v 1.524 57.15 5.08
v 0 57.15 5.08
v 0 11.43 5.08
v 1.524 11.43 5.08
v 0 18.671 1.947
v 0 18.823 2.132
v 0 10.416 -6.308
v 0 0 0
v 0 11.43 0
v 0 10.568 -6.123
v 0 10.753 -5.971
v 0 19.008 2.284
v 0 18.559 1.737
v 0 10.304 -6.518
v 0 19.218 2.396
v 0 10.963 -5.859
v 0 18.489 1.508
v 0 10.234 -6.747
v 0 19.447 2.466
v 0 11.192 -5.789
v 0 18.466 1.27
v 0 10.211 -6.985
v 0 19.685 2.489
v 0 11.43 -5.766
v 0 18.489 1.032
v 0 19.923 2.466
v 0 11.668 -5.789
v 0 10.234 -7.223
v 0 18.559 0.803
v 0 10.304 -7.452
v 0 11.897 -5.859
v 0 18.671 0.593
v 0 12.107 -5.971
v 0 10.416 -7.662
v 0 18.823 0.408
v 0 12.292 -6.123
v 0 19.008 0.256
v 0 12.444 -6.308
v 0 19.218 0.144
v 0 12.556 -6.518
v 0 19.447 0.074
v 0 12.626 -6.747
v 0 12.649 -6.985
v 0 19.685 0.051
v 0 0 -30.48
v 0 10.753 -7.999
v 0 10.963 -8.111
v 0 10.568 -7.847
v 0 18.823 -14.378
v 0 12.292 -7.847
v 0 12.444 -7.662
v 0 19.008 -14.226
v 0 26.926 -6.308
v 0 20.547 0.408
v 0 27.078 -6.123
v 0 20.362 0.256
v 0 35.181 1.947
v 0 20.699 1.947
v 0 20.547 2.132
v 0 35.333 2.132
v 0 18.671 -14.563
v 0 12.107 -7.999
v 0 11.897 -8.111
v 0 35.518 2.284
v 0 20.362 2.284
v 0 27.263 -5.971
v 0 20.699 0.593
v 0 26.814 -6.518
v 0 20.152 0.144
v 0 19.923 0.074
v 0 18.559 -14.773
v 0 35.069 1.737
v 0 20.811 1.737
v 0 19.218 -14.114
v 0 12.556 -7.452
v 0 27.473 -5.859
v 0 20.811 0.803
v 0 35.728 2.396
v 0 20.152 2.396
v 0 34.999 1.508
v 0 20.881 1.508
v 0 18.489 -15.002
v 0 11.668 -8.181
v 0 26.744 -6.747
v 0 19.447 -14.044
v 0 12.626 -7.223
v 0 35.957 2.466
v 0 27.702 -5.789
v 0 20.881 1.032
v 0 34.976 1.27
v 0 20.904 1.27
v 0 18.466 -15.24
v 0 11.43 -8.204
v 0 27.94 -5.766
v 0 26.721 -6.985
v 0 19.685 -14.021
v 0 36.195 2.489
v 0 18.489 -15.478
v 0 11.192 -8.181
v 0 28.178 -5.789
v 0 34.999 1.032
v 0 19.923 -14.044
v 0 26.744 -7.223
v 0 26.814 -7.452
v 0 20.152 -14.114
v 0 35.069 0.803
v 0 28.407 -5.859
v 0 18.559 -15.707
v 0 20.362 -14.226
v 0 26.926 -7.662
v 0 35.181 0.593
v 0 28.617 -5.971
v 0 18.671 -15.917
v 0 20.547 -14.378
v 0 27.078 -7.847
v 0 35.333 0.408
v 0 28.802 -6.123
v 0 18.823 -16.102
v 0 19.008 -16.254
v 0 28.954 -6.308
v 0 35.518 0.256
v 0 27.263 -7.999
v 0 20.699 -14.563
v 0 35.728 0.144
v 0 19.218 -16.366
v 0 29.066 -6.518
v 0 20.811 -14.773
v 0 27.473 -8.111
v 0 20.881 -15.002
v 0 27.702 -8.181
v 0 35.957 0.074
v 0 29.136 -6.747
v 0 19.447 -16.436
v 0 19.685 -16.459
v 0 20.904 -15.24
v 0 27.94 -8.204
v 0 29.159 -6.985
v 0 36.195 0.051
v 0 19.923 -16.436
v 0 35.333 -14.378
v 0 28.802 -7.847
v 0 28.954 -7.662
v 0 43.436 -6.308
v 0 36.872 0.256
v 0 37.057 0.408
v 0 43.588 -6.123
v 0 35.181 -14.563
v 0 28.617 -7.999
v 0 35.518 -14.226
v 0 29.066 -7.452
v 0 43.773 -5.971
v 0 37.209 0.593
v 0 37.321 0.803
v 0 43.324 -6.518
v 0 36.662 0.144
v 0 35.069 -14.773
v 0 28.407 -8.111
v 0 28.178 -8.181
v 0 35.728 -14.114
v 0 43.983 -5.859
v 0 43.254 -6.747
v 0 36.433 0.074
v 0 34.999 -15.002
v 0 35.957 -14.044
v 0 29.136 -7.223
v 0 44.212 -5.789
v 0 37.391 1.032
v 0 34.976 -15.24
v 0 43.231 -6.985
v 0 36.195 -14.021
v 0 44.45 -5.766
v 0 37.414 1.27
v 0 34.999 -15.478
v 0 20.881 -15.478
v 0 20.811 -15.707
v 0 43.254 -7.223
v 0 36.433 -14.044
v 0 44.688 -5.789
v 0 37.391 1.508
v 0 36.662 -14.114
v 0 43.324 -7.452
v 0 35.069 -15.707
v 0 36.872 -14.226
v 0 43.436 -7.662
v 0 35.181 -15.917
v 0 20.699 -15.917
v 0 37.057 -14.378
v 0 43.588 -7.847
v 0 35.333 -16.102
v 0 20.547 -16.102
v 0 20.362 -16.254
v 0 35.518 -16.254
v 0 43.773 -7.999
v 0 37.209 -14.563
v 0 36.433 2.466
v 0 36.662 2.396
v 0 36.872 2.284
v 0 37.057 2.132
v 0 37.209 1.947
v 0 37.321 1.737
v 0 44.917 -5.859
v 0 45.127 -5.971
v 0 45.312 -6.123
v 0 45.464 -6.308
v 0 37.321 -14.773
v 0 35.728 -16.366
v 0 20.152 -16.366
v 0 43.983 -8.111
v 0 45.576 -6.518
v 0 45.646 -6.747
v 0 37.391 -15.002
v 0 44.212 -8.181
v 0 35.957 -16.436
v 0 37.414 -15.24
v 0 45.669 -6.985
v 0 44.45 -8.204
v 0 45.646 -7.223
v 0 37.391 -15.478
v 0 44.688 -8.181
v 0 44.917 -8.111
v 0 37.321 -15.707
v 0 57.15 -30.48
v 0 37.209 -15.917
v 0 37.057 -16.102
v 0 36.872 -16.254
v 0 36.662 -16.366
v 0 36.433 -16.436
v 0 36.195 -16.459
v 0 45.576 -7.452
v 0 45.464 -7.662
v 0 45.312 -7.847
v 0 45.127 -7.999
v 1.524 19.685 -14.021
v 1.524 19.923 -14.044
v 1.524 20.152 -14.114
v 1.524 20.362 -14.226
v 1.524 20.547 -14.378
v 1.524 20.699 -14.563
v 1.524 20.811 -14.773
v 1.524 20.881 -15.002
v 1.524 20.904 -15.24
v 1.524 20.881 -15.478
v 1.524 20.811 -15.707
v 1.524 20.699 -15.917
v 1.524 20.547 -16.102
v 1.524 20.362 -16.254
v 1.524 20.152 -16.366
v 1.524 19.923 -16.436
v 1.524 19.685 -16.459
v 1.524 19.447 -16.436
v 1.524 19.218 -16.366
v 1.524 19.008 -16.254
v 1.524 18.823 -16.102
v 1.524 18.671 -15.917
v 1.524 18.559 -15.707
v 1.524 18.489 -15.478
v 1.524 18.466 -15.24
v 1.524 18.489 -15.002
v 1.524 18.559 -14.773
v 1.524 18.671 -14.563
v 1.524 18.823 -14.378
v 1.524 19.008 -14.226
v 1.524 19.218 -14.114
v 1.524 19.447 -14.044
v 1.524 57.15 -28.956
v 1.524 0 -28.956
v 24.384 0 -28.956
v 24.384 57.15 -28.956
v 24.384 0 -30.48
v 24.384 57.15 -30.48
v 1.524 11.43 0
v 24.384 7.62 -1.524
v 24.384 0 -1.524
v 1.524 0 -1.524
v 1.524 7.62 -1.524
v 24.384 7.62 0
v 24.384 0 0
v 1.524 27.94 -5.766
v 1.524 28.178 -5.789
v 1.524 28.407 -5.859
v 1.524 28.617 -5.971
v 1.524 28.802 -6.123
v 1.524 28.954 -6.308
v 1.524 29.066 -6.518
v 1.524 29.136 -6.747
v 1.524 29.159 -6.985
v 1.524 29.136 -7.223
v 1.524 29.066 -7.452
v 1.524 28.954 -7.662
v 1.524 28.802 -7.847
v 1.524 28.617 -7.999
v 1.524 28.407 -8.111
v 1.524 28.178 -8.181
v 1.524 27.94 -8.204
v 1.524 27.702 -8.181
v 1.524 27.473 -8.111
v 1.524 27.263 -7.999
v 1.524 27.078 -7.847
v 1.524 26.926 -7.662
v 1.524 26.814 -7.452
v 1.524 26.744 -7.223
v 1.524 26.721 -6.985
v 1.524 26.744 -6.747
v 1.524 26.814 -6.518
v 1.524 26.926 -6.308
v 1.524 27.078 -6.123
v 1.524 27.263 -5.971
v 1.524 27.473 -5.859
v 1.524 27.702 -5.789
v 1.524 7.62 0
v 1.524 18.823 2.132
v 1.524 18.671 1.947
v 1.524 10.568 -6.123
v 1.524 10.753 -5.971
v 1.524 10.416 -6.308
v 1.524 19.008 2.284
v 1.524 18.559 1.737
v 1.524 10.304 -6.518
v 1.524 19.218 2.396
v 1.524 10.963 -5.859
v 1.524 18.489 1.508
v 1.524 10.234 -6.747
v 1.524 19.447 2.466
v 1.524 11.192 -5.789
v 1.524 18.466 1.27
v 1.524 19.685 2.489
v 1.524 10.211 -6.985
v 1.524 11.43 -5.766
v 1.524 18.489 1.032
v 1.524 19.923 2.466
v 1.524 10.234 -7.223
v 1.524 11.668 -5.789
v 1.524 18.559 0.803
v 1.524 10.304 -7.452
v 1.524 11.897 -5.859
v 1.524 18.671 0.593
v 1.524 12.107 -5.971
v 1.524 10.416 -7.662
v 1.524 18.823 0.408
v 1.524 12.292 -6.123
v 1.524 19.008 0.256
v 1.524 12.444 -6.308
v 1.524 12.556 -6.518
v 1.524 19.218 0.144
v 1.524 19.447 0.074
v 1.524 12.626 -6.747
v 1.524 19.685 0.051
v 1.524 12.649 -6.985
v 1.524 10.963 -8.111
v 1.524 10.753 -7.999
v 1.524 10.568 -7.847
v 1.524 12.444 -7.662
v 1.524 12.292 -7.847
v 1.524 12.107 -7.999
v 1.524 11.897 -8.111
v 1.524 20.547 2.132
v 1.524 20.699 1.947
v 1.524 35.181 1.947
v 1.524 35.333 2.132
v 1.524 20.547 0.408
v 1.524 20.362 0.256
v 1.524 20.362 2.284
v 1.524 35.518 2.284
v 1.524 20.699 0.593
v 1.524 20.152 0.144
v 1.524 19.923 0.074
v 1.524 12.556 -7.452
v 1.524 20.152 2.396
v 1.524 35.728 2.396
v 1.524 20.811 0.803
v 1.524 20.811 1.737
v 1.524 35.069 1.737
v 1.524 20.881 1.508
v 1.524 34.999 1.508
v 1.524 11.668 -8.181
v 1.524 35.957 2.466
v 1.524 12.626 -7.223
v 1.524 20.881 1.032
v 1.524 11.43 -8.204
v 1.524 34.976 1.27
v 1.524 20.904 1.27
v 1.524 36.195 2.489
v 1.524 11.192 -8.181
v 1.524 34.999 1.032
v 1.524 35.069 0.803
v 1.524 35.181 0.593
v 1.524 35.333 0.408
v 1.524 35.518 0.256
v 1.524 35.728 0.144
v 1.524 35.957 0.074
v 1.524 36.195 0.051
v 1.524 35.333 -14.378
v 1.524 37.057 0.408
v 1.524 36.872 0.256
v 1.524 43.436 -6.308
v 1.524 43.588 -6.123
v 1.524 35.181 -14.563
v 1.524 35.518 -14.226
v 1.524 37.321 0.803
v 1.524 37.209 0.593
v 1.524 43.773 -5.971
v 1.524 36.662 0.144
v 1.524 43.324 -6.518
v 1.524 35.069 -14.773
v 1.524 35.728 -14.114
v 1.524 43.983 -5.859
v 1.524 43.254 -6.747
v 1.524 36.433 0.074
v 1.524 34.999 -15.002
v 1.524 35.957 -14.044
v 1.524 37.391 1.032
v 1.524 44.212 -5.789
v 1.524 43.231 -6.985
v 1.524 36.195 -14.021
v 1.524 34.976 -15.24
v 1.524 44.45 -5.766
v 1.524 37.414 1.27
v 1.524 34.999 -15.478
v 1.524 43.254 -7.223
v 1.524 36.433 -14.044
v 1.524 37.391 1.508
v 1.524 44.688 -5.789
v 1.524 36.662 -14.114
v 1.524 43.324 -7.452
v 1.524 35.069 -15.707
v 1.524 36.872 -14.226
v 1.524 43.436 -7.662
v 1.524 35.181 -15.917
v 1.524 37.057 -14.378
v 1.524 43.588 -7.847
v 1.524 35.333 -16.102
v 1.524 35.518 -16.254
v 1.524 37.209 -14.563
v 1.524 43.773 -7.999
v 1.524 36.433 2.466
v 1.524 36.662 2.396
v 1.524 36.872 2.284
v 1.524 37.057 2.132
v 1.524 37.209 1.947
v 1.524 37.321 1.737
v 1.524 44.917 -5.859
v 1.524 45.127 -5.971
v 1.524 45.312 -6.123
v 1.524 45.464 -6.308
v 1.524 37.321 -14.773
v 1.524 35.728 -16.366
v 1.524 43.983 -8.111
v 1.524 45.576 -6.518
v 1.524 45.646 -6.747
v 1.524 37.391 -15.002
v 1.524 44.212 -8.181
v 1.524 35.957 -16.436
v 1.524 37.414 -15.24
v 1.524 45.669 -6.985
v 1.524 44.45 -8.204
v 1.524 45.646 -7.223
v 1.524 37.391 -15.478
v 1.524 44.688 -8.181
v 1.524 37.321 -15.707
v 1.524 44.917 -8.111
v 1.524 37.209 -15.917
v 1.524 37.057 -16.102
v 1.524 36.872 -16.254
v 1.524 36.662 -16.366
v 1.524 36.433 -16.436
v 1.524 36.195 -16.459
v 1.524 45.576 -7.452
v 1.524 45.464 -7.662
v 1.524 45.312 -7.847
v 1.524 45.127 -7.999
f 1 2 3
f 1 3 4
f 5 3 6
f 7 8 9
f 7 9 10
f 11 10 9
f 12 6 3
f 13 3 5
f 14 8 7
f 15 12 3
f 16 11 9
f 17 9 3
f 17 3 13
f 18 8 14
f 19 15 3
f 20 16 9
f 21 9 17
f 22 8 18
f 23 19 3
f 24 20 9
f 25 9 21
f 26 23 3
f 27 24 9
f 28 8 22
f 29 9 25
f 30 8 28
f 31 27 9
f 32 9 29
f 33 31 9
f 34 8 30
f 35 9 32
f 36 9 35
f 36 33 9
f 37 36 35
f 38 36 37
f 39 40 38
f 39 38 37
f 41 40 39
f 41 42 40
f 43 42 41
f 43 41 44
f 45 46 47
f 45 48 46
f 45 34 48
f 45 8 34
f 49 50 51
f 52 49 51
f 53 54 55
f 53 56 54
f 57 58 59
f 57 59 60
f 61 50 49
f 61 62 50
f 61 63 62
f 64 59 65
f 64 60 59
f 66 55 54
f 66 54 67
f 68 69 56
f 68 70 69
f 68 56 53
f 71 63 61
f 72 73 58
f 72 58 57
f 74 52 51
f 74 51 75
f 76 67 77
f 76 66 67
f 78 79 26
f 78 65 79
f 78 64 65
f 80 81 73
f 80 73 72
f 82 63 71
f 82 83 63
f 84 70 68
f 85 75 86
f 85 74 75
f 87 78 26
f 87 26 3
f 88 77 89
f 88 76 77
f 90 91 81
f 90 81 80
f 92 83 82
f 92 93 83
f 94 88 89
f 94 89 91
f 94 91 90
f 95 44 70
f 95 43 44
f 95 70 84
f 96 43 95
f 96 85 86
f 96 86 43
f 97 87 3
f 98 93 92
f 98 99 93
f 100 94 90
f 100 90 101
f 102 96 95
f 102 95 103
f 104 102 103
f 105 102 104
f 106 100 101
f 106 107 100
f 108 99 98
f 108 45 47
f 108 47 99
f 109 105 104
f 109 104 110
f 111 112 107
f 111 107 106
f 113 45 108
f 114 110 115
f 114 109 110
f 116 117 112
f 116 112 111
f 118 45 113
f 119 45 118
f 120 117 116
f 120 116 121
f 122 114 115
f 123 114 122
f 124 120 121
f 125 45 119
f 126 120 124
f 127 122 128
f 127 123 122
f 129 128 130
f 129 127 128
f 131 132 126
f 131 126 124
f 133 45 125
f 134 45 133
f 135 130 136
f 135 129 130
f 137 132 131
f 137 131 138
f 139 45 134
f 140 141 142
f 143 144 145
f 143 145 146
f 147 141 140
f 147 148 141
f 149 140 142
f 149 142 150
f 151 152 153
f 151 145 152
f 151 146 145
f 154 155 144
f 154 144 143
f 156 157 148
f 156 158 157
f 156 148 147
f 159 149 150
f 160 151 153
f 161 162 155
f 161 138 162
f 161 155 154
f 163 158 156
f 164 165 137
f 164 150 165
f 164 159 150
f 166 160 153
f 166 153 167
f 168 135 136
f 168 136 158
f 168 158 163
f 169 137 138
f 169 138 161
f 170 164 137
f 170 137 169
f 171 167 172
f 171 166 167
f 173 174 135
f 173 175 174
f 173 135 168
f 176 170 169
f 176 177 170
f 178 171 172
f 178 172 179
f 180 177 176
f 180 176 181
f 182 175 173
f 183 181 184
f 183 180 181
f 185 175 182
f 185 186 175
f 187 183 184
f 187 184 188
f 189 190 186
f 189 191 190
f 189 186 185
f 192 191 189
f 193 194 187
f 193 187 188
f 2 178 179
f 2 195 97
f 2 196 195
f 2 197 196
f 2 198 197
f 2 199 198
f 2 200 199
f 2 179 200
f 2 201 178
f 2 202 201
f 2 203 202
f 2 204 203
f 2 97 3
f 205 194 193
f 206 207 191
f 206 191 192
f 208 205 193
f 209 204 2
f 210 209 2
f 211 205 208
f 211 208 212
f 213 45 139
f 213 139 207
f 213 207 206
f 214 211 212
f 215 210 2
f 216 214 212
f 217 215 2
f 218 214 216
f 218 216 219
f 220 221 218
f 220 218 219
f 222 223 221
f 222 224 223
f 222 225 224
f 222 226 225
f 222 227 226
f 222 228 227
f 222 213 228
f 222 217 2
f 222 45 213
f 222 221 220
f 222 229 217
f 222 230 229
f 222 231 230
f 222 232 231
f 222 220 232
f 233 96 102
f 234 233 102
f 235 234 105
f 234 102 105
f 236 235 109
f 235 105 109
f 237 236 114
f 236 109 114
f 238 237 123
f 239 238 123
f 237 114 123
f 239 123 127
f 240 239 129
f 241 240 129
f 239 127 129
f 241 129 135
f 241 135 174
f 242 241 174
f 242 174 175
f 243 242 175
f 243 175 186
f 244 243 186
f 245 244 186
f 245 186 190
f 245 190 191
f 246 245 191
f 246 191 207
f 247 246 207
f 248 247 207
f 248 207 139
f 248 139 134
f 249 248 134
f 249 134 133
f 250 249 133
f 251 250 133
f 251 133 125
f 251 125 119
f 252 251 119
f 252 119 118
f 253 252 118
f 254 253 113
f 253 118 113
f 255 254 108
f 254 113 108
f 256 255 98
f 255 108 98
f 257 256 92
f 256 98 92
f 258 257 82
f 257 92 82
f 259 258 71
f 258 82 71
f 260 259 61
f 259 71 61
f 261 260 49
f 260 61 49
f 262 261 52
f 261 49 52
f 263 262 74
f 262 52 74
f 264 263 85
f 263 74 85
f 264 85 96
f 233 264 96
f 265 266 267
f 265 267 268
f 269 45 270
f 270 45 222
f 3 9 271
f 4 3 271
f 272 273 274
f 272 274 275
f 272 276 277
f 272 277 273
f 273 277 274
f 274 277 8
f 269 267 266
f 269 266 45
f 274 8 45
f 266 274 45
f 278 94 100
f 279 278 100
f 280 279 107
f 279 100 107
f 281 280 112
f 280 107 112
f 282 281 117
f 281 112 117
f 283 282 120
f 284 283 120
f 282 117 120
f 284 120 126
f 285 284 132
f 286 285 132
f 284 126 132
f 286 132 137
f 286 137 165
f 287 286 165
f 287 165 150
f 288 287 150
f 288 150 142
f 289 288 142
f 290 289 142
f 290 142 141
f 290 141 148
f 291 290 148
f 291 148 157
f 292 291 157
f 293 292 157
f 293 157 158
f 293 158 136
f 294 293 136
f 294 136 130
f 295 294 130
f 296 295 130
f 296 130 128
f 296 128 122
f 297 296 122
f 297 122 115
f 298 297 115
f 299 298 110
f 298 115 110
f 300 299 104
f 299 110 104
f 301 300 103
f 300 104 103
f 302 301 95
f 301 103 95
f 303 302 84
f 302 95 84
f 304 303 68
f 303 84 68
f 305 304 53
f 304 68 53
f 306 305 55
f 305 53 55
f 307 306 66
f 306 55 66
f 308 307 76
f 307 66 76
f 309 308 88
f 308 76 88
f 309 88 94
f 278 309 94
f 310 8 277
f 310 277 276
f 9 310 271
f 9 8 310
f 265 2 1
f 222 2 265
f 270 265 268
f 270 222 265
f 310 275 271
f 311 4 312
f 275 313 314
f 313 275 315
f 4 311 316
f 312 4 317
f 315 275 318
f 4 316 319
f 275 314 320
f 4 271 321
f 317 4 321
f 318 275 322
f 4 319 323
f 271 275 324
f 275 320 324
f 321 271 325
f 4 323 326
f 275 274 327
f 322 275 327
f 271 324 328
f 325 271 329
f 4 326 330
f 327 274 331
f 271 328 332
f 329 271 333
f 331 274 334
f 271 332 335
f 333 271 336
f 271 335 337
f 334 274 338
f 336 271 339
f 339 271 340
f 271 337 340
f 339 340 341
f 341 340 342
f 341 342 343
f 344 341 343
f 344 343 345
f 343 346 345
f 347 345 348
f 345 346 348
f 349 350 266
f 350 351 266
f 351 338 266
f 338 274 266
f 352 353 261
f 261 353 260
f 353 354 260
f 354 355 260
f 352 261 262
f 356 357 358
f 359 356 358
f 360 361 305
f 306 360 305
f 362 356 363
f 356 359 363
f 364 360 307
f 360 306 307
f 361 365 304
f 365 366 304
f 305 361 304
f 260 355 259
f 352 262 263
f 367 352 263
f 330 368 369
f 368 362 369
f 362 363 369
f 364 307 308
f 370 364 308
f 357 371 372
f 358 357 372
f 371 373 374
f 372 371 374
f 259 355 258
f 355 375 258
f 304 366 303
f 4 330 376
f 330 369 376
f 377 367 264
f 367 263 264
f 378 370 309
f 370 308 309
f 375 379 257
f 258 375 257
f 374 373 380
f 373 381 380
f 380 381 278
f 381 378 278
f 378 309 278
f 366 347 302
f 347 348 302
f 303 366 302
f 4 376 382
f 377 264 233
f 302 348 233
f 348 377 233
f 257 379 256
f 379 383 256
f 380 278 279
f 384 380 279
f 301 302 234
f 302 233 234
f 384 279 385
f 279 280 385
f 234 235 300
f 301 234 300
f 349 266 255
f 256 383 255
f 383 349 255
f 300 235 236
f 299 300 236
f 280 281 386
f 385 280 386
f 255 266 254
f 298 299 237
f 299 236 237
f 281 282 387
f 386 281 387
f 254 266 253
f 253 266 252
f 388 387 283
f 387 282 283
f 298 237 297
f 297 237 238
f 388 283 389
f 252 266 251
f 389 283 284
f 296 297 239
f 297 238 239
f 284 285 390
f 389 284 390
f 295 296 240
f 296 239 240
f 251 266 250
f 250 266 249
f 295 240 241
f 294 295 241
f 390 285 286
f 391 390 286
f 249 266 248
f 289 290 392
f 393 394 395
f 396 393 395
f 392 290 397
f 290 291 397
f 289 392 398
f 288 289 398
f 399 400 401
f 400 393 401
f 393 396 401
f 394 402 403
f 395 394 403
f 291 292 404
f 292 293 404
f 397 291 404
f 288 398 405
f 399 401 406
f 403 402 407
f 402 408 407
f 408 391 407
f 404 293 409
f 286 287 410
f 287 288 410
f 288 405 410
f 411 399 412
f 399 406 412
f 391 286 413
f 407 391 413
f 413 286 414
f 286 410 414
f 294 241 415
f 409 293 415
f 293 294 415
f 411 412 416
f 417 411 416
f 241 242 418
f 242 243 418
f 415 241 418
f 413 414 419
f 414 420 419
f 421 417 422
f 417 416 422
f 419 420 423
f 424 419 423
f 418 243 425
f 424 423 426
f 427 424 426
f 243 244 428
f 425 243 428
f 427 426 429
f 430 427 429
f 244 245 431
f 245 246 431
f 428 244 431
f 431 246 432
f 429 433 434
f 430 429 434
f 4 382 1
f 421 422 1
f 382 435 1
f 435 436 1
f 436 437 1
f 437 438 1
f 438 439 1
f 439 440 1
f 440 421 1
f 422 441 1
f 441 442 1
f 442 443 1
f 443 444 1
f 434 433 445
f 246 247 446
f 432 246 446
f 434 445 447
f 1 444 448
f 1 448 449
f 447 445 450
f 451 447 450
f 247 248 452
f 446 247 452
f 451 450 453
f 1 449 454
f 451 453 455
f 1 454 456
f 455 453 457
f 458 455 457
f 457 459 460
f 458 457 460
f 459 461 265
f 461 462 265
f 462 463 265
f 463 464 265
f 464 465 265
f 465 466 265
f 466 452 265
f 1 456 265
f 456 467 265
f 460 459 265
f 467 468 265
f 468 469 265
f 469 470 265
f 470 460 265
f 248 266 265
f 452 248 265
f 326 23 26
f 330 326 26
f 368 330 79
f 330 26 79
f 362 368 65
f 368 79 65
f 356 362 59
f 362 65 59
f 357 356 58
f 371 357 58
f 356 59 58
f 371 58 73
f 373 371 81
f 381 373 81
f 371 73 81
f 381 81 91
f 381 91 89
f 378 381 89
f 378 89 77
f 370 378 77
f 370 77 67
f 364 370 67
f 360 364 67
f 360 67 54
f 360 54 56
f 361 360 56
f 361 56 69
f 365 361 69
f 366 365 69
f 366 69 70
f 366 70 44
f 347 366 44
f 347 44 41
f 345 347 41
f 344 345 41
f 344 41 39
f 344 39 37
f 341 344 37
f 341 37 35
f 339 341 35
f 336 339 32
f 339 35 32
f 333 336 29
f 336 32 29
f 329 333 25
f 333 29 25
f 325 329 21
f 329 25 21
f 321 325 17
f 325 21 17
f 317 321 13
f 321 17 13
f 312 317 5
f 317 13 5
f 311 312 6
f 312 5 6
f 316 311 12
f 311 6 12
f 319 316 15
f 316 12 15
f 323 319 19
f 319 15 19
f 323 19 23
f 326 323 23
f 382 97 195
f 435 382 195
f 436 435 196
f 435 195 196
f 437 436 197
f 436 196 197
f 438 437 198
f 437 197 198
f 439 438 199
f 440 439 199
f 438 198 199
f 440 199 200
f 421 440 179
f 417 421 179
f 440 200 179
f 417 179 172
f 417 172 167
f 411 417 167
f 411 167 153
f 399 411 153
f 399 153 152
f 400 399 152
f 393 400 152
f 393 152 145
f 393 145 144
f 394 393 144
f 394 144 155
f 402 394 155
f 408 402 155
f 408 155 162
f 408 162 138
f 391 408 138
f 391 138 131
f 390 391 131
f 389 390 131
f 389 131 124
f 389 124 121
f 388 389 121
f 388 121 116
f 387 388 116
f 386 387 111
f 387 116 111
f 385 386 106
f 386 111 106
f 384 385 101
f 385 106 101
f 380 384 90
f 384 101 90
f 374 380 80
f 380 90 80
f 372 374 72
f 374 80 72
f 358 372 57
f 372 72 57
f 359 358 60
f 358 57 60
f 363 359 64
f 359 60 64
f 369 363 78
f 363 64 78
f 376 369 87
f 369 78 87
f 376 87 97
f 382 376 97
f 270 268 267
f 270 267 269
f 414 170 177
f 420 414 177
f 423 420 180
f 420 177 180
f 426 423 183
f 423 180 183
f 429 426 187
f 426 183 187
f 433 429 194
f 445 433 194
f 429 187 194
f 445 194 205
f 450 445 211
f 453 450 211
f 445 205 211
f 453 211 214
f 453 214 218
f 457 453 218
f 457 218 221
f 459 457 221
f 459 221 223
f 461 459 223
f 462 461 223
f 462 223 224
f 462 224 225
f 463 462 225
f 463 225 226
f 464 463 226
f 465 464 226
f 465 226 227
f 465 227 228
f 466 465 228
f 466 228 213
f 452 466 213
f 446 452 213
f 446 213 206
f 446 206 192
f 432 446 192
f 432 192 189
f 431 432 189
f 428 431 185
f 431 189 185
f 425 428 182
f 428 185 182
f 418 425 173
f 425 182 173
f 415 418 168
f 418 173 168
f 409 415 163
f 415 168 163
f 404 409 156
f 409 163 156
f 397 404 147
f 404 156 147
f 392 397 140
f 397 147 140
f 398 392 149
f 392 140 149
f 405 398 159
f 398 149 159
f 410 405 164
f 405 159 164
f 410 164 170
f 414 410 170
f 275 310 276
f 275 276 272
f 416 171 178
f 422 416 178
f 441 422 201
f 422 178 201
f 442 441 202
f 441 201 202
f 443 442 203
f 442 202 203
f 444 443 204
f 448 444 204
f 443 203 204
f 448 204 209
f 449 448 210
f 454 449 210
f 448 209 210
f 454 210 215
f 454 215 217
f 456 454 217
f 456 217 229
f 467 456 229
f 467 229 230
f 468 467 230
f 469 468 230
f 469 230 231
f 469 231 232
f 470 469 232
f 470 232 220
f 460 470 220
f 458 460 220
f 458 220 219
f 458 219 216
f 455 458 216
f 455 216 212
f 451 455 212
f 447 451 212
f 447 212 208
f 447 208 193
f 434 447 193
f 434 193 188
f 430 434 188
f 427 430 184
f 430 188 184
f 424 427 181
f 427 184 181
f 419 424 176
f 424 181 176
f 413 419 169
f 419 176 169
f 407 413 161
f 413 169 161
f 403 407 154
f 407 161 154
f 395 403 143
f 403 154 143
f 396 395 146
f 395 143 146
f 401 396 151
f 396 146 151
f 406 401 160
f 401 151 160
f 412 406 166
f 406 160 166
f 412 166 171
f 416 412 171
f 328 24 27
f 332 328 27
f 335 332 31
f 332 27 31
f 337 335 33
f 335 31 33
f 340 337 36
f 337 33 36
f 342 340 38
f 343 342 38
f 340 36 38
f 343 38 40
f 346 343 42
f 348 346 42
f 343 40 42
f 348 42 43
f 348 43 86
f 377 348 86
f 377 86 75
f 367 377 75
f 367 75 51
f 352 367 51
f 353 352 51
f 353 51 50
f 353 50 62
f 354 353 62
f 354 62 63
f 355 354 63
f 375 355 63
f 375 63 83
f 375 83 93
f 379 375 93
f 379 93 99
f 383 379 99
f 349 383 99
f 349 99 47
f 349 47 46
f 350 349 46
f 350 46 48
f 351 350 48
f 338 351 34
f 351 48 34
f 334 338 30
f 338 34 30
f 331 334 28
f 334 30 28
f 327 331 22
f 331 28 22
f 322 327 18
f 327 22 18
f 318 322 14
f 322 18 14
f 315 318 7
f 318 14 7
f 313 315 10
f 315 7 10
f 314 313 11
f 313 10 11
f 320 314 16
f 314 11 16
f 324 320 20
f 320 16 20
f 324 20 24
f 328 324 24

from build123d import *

# Parameters (mm, degrees)
SKETCH1_W             = 30.48
SKETCH1_H             = 57.15
BOSS_EXTRUDE1_DEPTH   = 1.524
SKETCH2_W             = 1.524
SKETCH2_H             = 57.15
SKETCH2_H_2           = 7.62
BOSS_EXTRUDE2_DEPTH   = 22.86
SKETCH3_W             = 1.524
SKETCH3_H             = 45.72
BOSS_EXTRUDE3_DEPTH   = 5.08
F_2_CLEARANCE_HOLE1_D = 2.4384


with BuildPart() as part:
    # Sketch1 → Boss-Extrude1 (new body)
    with BuildSketch(Plane(origin=(0, 0, 0), x_dir=(0, 0, -1), z_dir=(1, 0, 0))):
        with Locations((15.24, 28.575)):
            Rectangle(SKETCH1_W, SKETCH1_H)
    extrude(amount=BOSS_EXTRUDE1_DEPTH)

    # Sketch2 → Boss-Extrude2 (add)
    with BuildSketch(Plane(origin=(1.524, 0, 0), x_dir=(0, 0, -1), z_dir=(1, 0, 0))):
        with Locations((29.718, 28.575)):
            Rectangle(SKETCH2_W, SKETCH2_H)
        with Locations((0.762, 3.81)):
            Rectangle(SKETCH2_W, SKETCH2_H_2)
    extrude(amount=BOSS_EXTRUDE2_DEPTH)

    # Sketch3 → Boss-Extrude3 (add)
    with BuildSketch(Plane.XY):
        with Locations((0.762, 34.29)):
            Rectangle(SKETCH3_W, SKETCH3_H)
    extrude(amount=BOSS_EXTRUDE3_DEPTH)

    # #2 Clearance Hole1 (through all)
    with Locations(Plane(origin=(1.524, 0, 0), x_dir=(0, 0, -1), z_dir=(1, 0, 0))):
        with Locations((-1.27, 36.195), (15.24, 36.195), (6.985, 44.45), (6.985, 27.94), (6.985, 11.43), (15.24, 19.685), (-1.27, 19.685)):
            Hole(F_2_CLEARANCE_HOLE1_D / 2)


solid = part.part
